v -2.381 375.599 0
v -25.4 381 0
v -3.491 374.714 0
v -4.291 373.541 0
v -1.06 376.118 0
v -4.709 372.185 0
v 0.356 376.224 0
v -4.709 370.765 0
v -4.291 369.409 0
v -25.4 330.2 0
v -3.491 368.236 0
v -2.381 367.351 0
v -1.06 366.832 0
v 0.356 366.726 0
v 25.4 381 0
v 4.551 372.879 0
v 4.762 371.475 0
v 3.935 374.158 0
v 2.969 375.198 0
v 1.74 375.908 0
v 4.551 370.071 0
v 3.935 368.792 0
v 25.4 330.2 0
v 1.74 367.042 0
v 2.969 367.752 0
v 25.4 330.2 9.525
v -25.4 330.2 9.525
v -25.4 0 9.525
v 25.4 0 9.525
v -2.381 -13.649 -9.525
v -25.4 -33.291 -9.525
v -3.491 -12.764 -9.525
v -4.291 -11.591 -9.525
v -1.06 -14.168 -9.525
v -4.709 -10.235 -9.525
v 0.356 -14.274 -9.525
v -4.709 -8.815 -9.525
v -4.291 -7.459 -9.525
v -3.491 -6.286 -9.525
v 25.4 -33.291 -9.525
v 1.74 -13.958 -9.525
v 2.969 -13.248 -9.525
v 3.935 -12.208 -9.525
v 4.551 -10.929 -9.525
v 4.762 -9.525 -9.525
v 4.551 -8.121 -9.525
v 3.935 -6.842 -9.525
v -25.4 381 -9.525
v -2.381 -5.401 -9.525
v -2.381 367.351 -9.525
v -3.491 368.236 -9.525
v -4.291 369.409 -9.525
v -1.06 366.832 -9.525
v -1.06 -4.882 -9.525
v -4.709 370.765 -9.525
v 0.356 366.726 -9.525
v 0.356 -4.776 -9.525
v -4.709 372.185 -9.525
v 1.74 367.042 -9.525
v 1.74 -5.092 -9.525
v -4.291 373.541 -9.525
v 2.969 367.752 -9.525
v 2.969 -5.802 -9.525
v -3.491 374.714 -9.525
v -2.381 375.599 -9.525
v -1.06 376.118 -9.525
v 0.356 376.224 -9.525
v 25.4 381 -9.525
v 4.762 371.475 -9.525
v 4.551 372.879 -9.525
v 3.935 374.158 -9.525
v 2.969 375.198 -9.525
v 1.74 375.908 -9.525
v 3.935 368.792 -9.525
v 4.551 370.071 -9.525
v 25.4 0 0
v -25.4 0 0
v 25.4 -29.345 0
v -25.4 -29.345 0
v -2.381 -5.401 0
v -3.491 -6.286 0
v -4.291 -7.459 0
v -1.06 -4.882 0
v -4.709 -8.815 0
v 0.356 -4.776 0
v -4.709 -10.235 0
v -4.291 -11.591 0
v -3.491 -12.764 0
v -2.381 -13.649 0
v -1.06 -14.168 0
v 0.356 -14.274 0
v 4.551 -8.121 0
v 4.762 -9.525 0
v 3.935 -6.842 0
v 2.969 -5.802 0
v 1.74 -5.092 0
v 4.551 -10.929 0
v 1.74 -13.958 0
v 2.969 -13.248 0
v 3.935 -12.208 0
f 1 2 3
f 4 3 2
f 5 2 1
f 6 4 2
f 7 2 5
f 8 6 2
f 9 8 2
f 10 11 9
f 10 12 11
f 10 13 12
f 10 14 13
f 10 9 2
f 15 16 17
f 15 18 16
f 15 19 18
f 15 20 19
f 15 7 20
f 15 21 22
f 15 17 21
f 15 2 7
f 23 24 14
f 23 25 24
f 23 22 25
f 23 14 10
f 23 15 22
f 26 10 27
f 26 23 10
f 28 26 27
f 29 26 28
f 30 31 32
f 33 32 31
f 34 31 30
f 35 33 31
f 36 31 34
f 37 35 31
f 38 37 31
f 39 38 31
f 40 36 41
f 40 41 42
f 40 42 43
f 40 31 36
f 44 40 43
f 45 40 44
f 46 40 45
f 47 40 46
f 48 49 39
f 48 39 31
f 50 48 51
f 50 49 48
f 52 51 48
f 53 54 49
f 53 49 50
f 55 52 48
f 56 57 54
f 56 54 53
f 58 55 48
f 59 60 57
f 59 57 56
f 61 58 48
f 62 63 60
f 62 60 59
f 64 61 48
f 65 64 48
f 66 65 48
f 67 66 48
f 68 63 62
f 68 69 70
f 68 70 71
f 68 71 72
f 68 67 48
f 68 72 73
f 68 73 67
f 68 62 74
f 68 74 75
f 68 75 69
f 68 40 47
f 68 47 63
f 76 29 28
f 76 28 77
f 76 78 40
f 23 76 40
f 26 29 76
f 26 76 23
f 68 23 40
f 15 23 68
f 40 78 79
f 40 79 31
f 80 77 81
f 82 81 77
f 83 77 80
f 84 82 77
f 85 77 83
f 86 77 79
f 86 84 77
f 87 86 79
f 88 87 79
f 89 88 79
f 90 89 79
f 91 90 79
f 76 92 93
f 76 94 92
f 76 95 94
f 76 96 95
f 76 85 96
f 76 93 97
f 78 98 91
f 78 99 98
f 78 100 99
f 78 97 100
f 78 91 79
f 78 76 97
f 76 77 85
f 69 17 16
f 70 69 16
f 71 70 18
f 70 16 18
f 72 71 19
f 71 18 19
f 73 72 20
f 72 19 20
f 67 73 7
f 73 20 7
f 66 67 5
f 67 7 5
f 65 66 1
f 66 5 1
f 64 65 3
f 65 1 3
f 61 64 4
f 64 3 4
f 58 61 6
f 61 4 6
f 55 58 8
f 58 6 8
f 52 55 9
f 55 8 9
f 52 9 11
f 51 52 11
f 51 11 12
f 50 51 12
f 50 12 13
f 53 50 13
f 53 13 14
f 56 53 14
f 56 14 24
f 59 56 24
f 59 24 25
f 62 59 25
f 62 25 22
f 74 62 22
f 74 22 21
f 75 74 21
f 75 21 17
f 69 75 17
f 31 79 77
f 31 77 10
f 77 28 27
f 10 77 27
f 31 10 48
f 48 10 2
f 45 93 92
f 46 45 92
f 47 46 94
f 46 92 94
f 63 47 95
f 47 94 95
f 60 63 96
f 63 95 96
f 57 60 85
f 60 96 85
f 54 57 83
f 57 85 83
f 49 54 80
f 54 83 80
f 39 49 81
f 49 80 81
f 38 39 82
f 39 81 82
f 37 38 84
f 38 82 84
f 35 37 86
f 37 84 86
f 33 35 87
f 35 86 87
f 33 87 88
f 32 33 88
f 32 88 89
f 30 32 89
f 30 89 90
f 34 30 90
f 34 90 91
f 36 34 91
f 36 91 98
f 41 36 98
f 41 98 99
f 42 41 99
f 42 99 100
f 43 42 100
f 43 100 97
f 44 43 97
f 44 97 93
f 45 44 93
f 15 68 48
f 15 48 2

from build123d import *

# Parameters (mm, degrees)
F1_DEPTH = 25.4
F2_R     = 4.7625
F3_DEPTH = 25.4


with BuildPart() as f1:
    # F0 (on Right) → F1 (new body, symmetric)
    with BuildSketch(Plane.YZ):
        Polygon((330.2, 9.525), (0, 9.525), (0, 0), (-29.345384, 0), (-33.290768, -9.525), (381, -9.525), (381, 0), (330.2, 0), align=None)
    extrude(amount=F1_DEPTH, both=True)

    # F2 (on Top) → F3 (cut)
    with BuildSketch(Plane.XY):
        with Locations((0, -9.525)):
            Circle(F2_R)
        with Locations((0, 371.475)):
            Circle(F2_R)
    extrude(amount=-F3_DEPTH, mode=Mode.SUBTRACT)


solid = f1.part
